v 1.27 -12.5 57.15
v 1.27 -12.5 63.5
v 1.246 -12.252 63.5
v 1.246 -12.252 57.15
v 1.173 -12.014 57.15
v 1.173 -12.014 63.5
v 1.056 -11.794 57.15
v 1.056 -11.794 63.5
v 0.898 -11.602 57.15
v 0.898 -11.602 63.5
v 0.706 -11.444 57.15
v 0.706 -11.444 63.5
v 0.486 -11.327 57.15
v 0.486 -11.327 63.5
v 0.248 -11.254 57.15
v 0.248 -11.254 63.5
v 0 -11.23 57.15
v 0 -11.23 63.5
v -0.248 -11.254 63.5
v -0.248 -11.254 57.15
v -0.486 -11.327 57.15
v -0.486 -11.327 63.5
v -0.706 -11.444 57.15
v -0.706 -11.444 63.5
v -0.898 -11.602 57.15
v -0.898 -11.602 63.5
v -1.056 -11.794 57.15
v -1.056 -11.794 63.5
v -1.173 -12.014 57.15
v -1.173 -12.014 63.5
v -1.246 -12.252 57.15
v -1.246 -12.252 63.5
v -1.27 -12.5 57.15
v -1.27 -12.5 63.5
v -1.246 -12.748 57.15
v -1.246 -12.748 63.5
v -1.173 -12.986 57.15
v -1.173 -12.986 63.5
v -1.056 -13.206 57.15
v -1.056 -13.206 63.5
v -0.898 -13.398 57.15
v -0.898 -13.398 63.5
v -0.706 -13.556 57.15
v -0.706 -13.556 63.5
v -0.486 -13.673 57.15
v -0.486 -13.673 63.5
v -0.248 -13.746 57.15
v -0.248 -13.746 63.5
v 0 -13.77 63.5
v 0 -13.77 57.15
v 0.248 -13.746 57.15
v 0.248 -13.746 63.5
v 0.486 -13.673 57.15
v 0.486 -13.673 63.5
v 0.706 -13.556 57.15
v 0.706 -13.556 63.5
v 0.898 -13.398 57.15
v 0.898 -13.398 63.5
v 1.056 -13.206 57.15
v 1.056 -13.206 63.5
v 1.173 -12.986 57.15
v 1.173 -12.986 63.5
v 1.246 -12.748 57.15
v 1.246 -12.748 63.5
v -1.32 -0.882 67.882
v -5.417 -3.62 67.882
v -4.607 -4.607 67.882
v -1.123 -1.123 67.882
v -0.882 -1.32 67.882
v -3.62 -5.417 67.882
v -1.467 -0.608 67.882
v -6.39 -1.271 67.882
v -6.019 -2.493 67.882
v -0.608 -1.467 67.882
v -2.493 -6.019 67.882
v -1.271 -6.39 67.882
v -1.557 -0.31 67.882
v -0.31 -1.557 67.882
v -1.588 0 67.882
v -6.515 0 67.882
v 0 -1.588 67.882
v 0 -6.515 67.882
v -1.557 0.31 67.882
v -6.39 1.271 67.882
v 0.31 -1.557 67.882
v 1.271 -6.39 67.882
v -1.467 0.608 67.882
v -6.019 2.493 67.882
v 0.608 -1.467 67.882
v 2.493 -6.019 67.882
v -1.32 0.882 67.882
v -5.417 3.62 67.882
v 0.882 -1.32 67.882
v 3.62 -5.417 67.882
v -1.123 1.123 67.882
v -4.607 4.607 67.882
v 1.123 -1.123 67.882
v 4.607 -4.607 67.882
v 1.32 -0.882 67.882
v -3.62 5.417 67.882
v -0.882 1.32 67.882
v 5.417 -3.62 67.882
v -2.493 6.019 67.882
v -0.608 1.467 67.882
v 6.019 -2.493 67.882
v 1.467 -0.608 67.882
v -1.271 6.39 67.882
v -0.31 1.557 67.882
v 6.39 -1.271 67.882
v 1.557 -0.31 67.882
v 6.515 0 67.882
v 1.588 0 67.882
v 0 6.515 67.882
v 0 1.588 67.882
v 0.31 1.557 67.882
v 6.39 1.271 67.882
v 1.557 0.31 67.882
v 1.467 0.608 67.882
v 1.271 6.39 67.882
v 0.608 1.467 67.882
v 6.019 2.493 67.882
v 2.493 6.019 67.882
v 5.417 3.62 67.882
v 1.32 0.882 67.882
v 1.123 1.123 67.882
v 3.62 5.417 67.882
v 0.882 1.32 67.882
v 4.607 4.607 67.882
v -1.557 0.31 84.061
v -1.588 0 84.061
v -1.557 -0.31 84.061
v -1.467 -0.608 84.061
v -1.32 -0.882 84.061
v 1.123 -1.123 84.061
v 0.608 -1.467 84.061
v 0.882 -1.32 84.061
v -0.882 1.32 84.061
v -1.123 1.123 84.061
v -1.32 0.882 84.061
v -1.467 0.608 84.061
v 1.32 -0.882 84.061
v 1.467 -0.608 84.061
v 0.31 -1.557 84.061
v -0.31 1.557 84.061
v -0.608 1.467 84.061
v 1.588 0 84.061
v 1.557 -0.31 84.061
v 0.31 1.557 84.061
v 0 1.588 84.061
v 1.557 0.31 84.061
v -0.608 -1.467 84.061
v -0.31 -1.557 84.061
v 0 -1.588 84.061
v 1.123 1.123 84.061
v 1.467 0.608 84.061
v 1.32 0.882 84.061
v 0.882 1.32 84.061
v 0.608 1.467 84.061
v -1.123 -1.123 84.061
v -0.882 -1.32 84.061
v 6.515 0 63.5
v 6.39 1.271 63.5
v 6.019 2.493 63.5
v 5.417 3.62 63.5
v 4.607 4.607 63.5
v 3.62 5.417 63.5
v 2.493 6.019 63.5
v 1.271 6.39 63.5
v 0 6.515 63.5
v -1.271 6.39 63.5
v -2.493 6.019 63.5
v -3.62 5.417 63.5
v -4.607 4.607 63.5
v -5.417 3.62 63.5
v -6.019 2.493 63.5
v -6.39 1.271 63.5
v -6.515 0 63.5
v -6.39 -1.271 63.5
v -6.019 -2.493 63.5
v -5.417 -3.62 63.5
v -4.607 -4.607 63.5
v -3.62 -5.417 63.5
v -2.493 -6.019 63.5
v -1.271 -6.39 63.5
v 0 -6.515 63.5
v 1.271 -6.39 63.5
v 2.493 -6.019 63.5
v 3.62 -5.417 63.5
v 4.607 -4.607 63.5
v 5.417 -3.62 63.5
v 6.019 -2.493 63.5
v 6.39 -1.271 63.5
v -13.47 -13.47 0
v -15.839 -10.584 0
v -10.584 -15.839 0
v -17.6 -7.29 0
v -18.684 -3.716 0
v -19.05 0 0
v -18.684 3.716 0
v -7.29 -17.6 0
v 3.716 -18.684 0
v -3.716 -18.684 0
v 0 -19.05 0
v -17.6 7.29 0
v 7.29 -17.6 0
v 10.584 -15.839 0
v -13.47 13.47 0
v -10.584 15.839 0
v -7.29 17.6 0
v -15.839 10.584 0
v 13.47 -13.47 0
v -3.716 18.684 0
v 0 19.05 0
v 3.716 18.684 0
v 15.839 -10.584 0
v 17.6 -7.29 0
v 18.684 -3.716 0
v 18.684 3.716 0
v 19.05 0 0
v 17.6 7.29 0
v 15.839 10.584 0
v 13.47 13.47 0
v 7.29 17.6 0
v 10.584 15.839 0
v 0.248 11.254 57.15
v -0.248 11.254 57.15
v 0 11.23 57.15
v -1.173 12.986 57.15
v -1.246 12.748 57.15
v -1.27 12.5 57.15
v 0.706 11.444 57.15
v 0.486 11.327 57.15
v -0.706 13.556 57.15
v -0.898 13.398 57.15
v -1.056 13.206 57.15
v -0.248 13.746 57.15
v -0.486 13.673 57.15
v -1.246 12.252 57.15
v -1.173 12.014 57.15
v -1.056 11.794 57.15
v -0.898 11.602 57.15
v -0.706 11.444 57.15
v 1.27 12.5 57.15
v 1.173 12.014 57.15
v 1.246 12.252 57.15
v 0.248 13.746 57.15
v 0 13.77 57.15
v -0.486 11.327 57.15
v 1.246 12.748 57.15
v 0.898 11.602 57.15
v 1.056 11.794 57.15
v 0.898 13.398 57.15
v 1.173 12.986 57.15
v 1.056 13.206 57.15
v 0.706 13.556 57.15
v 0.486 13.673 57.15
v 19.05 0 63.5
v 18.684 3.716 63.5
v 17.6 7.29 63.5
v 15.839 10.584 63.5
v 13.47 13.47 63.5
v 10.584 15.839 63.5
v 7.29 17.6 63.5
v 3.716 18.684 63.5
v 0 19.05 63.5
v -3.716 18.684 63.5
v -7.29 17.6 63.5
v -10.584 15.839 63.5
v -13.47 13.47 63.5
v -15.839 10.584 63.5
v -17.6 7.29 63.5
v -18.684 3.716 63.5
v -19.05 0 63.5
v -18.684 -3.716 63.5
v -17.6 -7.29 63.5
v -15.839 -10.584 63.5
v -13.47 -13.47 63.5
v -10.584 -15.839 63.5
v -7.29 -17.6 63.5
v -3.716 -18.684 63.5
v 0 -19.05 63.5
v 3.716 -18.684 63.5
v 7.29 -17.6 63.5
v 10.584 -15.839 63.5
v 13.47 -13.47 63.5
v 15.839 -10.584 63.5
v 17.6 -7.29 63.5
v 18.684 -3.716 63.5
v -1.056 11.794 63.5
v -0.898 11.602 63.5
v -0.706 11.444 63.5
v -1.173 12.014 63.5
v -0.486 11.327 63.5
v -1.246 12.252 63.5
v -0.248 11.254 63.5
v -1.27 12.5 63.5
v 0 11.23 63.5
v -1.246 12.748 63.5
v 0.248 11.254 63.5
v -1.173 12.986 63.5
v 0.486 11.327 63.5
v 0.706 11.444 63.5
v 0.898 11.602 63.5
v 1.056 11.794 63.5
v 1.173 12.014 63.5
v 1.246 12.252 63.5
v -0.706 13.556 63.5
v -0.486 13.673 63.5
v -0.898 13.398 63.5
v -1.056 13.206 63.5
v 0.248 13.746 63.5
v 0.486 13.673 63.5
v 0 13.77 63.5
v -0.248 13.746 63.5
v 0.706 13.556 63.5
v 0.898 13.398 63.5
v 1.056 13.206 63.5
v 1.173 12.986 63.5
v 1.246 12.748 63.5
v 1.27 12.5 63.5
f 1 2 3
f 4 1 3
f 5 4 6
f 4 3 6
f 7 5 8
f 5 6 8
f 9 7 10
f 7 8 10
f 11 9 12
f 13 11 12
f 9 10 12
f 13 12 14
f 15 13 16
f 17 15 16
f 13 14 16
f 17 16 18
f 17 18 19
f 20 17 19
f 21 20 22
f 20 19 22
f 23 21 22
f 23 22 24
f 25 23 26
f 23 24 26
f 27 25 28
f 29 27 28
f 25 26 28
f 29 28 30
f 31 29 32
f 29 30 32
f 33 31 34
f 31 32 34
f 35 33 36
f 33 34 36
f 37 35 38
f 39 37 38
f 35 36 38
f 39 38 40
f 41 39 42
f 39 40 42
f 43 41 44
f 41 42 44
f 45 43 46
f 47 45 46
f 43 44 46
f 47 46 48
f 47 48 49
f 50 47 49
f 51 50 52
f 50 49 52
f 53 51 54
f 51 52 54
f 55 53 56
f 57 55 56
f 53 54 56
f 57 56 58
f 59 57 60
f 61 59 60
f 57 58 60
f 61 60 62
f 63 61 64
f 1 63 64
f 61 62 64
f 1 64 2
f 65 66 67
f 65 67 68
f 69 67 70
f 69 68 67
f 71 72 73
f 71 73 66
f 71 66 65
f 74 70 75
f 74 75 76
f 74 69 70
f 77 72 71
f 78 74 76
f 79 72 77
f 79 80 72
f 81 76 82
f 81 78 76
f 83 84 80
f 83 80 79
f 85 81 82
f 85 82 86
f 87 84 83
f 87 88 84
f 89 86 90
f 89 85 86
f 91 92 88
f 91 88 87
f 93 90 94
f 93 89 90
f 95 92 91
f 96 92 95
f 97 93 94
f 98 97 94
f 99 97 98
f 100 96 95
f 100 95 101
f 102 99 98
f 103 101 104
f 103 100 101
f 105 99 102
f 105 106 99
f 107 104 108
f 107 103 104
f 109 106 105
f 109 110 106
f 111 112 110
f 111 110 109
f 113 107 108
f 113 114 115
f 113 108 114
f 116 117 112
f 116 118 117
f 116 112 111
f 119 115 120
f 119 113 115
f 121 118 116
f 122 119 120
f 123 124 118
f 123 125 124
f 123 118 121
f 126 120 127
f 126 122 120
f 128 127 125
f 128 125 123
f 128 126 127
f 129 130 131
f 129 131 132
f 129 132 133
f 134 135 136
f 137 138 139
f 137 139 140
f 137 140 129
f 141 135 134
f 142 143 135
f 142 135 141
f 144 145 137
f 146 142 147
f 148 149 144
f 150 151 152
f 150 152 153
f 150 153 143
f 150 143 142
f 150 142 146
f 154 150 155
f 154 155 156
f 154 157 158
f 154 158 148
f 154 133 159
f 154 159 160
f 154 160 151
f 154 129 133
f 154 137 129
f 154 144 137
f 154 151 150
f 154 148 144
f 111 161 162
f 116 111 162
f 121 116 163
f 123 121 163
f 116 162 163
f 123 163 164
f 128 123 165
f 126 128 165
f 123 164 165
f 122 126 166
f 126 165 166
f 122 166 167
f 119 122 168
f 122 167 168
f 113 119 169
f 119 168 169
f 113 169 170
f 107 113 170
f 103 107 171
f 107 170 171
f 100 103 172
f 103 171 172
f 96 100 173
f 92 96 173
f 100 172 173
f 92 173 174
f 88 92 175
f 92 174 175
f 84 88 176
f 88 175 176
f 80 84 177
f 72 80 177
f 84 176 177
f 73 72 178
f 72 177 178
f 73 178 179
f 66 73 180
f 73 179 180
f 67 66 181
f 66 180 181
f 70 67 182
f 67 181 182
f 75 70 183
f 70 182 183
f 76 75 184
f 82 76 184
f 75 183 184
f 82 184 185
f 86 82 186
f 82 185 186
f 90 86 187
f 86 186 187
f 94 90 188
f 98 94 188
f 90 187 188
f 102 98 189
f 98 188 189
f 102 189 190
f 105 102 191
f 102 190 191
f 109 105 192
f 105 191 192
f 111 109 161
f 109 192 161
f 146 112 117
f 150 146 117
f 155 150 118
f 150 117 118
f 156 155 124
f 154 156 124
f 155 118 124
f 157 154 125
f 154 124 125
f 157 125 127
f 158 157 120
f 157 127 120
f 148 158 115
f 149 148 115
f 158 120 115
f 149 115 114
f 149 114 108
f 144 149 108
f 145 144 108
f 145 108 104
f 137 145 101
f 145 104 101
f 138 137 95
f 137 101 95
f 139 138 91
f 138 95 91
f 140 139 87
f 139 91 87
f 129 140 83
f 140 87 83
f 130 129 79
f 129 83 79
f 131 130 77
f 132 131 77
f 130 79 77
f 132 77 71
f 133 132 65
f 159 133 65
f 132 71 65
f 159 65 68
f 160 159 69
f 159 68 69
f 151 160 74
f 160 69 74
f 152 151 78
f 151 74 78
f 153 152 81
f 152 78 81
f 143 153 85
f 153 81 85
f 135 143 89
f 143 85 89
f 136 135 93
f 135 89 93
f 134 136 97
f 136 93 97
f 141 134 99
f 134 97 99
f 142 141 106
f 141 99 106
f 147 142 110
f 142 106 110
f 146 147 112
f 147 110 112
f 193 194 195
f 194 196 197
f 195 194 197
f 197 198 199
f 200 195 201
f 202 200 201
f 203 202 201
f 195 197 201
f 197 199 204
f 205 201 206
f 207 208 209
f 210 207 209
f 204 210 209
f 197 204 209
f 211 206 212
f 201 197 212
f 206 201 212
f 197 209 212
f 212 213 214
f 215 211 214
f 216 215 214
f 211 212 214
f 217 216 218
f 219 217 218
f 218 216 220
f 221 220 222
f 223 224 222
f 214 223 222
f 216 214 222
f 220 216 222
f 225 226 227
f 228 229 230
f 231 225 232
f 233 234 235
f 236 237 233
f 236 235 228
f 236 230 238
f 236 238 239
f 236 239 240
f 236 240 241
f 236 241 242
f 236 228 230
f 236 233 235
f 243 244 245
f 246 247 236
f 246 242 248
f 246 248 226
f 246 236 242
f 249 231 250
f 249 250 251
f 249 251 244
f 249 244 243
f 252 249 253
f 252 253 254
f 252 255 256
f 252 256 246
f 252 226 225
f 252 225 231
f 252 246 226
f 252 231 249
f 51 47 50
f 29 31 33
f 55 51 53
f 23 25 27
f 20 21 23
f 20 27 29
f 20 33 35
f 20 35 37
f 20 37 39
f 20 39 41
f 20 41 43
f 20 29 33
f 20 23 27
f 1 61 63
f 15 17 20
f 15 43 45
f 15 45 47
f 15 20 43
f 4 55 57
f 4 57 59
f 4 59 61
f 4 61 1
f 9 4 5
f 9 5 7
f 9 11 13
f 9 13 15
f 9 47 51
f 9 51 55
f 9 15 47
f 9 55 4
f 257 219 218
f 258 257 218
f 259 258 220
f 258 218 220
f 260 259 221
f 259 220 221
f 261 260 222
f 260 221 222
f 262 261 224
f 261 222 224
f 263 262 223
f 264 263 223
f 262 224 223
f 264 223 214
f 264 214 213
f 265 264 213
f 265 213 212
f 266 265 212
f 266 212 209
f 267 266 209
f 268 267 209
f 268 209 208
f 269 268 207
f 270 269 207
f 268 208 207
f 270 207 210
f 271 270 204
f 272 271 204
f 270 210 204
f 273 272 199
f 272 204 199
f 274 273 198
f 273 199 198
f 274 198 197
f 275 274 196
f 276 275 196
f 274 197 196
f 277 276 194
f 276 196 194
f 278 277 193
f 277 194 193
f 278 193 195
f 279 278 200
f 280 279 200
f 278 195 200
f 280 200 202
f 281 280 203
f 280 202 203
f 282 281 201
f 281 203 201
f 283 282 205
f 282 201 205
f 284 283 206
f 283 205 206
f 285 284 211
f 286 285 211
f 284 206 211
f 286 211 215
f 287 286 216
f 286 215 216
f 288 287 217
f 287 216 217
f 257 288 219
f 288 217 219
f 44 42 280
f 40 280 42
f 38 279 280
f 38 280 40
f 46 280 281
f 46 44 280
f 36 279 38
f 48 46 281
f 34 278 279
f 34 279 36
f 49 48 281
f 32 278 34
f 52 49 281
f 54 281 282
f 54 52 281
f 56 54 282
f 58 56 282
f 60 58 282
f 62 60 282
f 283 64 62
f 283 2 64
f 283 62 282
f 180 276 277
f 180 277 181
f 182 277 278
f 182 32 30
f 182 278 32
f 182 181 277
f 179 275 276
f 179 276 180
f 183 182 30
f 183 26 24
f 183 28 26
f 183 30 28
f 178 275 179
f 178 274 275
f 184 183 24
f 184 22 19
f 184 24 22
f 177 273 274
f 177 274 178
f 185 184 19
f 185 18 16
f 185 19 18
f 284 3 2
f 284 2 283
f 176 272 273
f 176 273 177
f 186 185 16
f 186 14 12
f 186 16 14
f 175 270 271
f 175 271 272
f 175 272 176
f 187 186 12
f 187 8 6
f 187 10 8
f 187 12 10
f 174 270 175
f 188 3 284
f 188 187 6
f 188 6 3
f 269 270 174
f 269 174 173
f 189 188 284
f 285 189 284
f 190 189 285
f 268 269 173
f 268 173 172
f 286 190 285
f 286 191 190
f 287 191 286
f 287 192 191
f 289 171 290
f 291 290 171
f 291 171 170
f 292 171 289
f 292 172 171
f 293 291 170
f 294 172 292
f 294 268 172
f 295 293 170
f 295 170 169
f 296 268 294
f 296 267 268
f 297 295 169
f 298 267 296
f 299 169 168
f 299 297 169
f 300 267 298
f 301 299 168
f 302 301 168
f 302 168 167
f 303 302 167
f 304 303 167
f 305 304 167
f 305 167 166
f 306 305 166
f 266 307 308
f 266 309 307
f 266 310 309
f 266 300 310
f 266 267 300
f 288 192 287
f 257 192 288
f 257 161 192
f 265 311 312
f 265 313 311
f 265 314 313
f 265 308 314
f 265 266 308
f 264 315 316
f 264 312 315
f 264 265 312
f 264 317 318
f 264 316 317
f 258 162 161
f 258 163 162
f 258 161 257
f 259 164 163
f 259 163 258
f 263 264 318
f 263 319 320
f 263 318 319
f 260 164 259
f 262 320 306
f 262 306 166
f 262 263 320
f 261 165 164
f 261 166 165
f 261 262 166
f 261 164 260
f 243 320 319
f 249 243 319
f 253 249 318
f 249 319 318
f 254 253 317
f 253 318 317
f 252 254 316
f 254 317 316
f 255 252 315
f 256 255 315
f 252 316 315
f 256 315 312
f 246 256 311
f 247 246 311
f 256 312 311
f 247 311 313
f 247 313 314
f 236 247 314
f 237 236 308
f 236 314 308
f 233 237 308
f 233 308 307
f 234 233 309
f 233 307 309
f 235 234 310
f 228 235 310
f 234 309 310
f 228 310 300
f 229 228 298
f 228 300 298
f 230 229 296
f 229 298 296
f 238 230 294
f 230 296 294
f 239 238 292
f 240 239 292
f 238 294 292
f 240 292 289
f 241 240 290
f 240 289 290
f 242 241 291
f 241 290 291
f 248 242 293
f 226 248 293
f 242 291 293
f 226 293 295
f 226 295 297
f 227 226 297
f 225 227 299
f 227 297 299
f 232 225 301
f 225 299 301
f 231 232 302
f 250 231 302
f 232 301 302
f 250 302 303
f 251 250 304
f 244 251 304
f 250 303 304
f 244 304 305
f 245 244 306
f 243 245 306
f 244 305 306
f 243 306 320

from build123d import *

# Parameters (mm, degrees)
SKETCH1_R           = 19.05
BOSS_EXTRUDE1_DEPTH = 63.5
SKETCH2_R           = 6.5151
BOSS_EXTRUDE2_DEPTH = 4.3815
SKETCH3_R           = 1.5875
BOSS_EXTRUDE3_DEPTH = 16.1798
SKETCH4_R           = 1.27
CUT_EXTRUDE1_DEPTH  = 6.35


with BuildPart() as part:
    # Sketch1 → Boss-Extrude1 (new body)
    with BuildSketch(Plane.XY):
        Circle(SKETCH1_R)
    extrude(amount=BOSS_EXTRUDE1_DEPTH)

    # Sketch2 → Boss-Extrude2 (add)
    with BuildSketch(Plane.XY.offset(63.5)):
        Circle(SKETCH2_R)
    extrude(amount=BOSS_EXTRUDE2_DEPTH)

    # Sketch3 → Boss-Extrude3 (add)
    with BuildSketch(Plane.XY.offset(67.8815)):
        Circle(SKETCH3_R)
    extrude(amount=BOSS_EXTRUDE3_DEPTH)

    # Sketch4 → Cut-Extrude1 (cut)
    with BuildSketch(Plane.XY.offset(63.5)):
        with Locations((0, 12.5)):
            Circle(SKETCH4_R)
        with Locations((0, -12.5)):
            Circle(SKETCH4_R)
    extrude(amount=-CUT_EXTRUDE1_DEPTH, mode=Mode.SUBTRACT)


solid = part.part
